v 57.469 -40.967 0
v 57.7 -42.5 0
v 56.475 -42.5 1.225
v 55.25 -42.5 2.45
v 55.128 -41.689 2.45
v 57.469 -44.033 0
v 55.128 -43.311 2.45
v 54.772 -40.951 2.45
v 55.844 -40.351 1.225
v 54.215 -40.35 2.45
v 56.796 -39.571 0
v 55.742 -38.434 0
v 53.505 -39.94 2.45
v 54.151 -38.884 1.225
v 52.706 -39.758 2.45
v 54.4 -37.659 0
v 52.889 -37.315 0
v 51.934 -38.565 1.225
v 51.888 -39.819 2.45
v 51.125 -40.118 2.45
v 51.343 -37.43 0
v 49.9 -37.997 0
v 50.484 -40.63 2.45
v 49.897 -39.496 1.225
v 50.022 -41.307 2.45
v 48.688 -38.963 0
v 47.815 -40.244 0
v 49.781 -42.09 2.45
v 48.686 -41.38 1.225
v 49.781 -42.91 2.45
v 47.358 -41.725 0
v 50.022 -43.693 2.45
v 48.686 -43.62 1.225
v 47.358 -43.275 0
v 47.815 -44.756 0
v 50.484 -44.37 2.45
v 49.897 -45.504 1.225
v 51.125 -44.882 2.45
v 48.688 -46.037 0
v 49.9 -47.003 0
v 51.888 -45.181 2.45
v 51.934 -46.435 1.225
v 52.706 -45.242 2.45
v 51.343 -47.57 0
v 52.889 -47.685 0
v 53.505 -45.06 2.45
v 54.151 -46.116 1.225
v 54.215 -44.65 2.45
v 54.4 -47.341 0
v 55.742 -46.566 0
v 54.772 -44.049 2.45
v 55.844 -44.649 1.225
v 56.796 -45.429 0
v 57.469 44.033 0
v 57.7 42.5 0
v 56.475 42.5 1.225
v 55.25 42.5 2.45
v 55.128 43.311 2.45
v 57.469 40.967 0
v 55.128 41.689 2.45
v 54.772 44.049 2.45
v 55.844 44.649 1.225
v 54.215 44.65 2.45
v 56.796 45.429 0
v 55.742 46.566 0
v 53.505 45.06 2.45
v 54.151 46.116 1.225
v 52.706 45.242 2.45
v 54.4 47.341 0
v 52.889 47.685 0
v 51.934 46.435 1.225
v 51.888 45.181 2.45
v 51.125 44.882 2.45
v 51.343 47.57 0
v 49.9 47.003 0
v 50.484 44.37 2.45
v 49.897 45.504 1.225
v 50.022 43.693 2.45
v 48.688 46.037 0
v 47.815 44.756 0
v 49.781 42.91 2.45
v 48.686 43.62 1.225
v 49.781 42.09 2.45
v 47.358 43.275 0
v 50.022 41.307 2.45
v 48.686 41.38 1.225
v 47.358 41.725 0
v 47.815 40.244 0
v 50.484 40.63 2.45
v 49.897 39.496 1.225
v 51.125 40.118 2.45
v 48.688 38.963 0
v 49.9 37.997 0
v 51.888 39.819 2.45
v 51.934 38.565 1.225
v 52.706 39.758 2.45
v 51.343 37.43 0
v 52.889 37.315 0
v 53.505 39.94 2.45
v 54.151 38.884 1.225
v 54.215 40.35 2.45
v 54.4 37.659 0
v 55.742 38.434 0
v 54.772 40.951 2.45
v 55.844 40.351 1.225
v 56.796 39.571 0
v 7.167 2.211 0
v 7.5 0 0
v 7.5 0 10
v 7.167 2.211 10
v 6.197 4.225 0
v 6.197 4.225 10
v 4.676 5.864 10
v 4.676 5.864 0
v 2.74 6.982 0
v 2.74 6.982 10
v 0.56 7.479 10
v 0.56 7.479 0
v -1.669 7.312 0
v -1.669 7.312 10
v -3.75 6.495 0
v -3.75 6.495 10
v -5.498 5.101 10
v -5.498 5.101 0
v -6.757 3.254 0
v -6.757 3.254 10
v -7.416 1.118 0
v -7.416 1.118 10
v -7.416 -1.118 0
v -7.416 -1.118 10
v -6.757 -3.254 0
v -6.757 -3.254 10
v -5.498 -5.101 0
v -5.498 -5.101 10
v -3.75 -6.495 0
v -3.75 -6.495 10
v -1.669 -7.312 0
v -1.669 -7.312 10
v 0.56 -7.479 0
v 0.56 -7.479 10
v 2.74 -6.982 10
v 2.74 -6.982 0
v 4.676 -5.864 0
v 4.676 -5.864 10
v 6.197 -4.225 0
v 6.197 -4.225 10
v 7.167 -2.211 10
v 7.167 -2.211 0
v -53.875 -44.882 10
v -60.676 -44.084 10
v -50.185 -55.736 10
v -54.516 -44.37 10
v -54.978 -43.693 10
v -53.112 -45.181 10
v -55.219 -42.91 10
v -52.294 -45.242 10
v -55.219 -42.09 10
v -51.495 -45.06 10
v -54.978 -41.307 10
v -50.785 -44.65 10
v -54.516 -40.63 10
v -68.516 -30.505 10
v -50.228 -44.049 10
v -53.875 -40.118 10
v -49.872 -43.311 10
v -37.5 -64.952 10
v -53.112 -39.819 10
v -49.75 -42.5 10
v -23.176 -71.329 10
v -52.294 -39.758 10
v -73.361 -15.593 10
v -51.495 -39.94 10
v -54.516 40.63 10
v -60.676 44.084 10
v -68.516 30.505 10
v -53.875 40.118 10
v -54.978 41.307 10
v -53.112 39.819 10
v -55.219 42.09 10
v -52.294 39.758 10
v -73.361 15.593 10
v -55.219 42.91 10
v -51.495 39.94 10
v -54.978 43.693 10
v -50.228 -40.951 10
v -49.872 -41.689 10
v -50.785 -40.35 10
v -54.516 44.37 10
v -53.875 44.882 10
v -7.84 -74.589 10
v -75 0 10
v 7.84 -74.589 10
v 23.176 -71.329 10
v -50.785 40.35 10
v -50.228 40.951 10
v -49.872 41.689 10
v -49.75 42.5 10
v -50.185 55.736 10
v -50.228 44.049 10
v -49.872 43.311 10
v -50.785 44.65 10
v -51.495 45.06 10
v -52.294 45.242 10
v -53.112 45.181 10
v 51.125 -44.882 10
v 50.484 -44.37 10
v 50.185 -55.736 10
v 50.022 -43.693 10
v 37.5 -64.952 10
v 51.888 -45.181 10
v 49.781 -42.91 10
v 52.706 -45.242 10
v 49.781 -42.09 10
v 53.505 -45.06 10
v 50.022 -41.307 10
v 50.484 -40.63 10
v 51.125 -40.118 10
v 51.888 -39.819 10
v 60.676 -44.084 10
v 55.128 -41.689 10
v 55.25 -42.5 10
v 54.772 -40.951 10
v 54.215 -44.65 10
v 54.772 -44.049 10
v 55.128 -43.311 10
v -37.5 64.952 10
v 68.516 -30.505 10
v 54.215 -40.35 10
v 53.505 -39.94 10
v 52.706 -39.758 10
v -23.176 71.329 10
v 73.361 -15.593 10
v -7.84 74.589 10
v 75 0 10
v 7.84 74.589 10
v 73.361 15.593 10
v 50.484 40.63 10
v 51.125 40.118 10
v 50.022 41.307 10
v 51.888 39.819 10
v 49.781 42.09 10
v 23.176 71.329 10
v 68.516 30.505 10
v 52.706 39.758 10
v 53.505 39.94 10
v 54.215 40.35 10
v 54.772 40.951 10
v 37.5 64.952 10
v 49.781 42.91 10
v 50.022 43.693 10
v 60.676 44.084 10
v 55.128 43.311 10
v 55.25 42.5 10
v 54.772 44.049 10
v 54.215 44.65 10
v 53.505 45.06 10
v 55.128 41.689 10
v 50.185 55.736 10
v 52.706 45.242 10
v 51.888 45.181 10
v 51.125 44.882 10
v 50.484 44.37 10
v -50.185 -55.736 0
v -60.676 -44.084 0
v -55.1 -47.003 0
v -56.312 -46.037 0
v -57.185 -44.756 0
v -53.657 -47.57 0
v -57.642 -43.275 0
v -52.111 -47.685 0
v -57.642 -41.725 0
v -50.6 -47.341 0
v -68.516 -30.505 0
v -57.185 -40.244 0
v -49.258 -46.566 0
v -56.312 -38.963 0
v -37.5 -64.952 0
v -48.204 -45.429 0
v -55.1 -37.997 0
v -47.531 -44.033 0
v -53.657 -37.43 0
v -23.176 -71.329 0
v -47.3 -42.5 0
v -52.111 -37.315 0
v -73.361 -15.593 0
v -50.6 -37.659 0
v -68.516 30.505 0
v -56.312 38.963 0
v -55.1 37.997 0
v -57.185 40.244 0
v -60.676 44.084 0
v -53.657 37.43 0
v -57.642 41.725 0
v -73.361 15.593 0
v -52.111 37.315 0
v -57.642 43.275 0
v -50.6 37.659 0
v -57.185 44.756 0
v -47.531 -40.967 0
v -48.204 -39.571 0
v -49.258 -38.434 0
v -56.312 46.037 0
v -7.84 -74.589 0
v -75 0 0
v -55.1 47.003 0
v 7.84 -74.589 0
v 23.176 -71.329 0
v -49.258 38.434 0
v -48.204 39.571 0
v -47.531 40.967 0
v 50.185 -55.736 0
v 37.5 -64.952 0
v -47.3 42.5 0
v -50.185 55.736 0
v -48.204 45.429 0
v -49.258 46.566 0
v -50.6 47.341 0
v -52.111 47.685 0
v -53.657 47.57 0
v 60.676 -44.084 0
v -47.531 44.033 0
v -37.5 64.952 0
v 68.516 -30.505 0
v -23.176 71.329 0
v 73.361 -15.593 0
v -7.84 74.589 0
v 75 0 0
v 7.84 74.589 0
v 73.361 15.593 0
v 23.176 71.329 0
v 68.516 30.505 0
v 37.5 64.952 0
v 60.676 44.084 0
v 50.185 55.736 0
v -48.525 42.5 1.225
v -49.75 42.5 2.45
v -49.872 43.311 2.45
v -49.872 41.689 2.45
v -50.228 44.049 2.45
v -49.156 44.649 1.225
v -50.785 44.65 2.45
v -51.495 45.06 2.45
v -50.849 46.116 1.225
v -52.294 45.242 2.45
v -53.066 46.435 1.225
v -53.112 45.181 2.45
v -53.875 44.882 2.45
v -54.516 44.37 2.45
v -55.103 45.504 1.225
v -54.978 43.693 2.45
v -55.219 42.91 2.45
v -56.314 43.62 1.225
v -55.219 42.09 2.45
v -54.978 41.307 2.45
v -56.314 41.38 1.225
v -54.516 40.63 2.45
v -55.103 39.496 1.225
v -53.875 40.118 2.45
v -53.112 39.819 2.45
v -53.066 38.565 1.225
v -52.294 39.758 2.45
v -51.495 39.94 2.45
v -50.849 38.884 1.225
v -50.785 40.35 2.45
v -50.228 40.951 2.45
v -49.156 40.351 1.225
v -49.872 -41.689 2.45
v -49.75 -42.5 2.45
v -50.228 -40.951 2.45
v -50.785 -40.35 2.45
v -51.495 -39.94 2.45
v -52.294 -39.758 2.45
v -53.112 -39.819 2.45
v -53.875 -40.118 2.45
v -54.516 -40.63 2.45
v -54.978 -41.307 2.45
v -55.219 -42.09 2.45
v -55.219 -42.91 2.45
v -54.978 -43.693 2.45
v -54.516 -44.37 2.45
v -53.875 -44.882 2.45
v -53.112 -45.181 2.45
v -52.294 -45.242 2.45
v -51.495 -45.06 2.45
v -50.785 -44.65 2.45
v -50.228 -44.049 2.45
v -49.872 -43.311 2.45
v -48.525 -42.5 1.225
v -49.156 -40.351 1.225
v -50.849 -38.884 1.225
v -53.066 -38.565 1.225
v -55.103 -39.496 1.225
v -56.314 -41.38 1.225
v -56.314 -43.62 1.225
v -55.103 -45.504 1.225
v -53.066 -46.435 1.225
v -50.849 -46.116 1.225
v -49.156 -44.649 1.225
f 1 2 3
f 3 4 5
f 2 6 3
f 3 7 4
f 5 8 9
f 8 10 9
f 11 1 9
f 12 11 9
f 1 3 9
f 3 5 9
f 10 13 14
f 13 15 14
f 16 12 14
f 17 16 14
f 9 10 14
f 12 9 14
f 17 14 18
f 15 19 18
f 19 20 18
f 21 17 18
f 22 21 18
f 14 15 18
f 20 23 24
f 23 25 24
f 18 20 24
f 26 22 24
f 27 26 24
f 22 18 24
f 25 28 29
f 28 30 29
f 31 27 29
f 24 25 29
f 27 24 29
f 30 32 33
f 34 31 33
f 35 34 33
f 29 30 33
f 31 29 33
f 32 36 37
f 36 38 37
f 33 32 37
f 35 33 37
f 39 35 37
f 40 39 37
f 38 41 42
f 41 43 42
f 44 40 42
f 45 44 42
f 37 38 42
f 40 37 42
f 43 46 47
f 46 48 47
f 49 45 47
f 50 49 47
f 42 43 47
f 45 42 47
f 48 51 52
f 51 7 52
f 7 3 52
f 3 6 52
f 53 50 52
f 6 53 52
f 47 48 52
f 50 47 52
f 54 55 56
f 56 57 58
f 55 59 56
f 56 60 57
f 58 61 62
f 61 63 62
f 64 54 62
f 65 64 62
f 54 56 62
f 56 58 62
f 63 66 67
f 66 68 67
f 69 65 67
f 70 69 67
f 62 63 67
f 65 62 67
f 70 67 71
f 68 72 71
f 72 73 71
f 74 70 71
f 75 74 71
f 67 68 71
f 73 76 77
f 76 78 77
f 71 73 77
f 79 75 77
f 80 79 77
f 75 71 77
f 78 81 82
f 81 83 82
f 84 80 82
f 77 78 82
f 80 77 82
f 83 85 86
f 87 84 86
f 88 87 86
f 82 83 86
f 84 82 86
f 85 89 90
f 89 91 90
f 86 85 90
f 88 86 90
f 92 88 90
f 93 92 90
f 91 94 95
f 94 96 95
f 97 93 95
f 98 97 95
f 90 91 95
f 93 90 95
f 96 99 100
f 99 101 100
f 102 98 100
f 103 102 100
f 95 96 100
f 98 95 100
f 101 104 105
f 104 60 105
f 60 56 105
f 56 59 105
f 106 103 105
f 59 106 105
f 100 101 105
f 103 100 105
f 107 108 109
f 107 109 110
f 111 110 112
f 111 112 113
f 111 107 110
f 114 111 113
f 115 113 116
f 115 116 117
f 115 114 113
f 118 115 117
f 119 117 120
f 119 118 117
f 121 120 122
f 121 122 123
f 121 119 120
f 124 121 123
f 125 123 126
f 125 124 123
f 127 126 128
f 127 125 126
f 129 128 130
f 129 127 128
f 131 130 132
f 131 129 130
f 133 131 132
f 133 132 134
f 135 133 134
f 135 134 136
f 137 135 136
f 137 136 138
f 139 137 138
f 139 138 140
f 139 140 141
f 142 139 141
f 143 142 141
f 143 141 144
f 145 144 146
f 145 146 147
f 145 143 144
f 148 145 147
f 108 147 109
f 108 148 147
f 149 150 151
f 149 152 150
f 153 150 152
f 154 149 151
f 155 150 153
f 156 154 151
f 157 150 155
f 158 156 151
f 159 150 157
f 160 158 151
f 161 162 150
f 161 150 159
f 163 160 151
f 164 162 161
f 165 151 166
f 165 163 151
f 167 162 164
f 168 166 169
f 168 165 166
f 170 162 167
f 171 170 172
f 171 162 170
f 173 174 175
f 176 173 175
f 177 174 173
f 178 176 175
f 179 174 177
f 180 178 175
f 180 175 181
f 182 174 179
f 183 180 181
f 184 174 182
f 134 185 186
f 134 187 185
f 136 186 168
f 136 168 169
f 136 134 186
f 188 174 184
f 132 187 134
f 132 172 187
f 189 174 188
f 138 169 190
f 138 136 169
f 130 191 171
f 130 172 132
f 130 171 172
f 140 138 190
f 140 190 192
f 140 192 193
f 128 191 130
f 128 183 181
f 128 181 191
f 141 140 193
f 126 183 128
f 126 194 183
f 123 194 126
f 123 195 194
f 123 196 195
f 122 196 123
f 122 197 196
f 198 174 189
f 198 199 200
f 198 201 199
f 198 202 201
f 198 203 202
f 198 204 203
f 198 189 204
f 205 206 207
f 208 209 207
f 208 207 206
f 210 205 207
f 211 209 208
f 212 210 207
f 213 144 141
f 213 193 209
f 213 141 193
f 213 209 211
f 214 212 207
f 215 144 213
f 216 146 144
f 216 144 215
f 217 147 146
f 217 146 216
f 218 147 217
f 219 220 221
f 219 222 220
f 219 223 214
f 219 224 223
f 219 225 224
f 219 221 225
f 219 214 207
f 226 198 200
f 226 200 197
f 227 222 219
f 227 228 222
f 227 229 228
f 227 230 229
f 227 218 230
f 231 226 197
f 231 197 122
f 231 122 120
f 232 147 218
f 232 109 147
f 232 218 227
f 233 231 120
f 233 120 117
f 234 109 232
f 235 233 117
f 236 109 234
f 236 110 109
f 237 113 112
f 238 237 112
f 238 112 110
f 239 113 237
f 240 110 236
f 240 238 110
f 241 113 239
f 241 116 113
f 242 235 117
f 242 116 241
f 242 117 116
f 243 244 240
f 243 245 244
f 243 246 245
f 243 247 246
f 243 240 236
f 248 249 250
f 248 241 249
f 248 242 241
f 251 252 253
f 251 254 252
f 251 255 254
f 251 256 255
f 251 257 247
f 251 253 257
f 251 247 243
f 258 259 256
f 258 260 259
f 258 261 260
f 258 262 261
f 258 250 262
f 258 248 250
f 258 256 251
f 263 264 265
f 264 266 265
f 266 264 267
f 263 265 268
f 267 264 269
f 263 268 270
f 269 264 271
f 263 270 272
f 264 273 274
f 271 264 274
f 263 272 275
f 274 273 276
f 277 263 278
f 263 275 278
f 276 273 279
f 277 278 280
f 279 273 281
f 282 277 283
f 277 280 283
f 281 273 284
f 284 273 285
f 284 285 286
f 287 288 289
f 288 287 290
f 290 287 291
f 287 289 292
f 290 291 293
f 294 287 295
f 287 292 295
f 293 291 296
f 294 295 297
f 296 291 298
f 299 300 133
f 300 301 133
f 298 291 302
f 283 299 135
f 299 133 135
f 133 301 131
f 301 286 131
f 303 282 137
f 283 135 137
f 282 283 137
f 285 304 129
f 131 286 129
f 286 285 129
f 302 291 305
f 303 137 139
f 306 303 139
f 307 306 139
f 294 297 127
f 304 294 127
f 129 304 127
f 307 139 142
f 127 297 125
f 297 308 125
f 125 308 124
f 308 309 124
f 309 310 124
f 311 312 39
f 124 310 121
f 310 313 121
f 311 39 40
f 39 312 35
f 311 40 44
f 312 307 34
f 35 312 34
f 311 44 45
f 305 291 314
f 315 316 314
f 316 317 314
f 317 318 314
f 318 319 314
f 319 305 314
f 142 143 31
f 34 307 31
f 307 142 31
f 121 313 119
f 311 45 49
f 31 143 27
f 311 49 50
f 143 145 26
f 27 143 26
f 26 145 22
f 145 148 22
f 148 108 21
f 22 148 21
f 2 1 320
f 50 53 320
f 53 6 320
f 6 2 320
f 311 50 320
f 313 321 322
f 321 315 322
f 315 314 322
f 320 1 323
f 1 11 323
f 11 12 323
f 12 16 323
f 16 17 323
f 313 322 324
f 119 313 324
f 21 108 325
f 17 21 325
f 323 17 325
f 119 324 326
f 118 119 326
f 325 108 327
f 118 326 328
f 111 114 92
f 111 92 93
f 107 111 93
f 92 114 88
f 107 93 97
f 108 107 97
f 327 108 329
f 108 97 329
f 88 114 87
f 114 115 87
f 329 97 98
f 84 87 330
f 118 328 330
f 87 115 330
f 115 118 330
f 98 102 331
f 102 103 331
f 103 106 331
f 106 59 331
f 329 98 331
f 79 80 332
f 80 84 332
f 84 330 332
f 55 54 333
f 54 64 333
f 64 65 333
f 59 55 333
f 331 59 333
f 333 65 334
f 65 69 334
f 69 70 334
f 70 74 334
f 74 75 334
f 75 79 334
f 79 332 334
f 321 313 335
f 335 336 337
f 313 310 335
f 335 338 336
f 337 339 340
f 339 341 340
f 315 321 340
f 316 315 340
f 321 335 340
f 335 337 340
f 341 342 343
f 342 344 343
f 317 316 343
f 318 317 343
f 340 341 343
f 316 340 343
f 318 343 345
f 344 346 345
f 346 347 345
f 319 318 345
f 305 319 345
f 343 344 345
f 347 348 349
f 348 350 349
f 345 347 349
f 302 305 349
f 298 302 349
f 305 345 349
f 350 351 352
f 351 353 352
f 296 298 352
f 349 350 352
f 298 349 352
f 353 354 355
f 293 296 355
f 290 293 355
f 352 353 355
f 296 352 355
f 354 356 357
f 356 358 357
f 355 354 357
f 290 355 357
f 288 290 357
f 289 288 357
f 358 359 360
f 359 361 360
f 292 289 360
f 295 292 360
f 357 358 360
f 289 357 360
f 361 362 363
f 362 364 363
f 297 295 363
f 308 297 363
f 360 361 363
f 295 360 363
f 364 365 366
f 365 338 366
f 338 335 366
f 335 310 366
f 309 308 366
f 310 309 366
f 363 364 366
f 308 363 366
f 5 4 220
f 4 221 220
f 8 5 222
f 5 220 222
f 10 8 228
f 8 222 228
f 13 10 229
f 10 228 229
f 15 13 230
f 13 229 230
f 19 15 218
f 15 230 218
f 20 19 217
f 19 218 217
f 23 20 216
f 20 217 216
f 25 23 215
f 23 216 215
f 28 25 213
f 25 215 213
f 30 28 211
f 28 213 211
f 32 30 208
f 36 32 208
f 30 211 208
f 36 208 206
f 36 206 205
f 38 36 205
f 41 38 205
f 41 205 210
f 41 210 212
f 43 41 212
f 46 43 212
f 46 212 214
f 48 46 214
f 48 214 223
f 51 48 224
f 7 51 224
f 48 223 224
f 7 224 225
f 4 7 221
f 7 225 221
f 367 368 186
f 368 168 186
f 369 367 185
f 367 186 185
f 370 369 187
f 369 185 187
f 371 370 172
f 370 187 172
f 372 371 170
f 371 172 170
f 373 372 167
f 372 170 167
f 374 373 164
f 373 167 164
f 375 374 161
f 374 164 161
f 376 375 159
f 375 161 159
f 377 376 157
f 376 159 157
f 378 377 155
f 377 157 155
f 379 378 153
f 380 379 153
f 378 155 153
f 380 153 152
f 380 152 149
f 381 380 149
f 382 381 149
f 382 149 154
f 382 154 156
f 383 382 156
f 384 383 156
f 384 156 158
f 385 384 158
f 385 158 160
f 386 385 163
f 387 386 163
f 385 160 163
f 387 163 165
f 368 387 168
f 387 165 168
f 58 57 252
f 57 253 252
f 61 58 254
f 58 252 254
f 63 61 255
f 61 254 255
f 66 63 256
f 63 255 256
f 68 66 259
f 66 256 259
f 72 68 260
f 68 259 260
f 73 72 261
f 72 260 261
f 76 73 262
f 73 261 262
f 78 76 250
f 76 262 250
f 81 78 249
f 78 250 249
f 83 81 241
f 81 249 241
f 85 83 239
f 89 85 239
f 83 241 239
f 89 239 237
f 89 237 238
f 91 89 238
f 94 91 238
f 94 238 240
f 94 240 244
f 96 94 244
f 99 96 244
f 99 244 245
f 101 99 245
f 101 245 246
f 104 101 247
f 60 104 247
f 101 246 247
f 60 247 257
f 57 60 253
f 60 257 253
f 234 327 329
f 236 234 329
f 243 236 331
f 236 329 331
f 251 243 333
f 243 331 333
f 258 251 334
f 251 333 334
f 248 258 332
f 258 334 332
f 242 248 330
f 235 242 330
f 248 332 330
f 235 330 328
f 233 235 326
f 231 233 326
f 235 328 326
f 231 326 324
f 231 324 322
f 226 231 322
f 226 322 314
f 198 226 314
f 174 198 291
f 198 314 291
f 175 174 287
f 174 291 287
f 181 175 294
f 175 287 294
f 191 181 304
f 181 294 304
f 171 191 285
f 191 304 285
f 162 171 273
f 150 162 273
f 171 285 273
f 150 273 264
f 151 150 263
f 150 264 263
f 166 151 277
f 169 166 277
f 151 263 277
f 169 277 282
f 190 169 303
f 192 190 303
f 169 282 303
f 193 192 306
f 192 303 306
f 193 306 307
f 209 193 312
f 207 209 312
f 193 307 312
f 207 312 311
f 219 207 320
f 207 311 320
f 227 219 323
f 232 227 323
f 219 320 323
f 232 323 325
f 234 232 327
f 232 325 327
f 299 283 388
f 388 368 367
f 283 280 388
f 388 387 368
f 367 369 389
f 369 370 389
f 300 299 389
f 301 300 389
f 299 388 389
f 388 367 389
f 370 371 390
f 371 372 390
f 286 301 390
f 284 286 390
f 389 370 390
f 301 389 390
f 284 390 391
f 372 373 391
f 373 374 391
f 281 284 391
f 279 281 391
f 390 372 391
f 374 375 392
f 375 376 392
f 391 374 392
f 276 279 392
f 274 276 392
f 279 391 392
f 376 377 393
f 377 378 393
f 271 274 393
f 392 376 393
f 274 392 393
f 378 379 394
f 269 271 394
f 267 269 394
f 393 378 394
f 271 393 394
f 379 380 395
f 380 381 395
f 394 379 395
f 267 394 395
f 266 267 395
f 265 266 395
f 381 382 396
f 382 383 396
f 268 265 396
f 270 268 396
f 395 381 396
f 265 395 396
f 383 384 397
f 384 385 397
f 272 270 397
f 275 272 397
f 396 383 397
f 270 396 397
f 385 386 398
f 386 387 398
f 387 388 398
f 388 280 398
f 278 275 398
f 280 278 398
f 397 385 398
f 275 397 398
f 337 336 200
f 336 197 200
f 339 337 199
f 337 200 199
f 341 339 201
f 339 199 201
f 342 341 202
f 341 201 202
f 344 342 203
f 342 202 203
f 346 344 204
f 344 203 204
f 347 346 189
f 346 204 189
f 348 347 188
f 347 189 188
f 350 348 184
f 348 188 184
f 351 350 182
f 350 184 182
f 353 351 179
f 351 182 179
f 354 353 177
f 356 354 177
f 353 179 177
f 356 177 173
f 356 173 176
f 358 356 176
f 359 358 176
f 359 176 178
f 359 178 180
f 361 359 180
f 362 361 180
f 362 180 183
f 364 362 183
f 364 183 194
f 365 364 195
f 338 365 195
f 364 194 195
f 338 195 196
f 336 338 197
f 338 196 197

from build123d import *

# Parameters (mm, degrees)
SKETCH1_R                                       = 75
SKETCH1_R_2                                     = 7.5
BOSS_EXTRUDE1_DEPTH                             = 10
SKETCH2_R                                       = 1.5
CUT_EXTRUDE1_DEPTH                              = 107.536378763
CSK_FOR_M5_FLAT_HEAD_MACHINE_SCREW1_D           = 5.5
CSK_FOR_M5_FLAT_HEAD_MACHINE_SCREW1_CSINK_D     = 10.4
CSK_FOR_M5_FLAT_HEAD_MACHINE_SCREW1_CSINK_ANGLE = 90


with BuildPart() as part:
    # Sketch1 → Boss-Extrude1 (new body)
    with BuildSketch(Plane(origin=(0, 0, 0), x_dir=(0, 1, 0), z_dir=(0, 0, 1))):
        with Locations(Location((0, 0, 0), (0, 0, 270))):
            Circle(SKETCH1_R)
        with Locations(Location((0, 0, 0), (0, 0, 270))):
            Circle(SKETCH1_R_2, mode=Mode.SUBTRACT)
    extrude(amount=BOSS_EXTRUDE1_DEPTH)

    # Sketch2 → Cut-Extrude1 (cut, through all)
    with BuildSketch(Plane.XY.offset(10)):
        with Locations((-52.5, 42.5)):
            Circle(SKETCH2_R)
        with Locations((52.5, 42.5)):
            Circle(SKETCH2_R)
        with Locations((52.5, -42.5)):
            Circle(SKETCH2_R)
        with Locations((-52.5, -42.5)):
            Circle(SKETCH2_R)
    extrude(amount=-CUT_EXTRUDE1_DEPTH, mode=Mode.SUBTRACT)

    # CSK for M5 Flat Head Machine Screw1 (through all)
    with Locations(Plane(origin=(-52.5, -42.5, 0), x_dir=(-1, 0, 0), z_dir=(0, 0, -1))):
        with Locations((0, 0), (-105, 0), (-105, 85), (0, 85)):
            CounterSinkHole(CSK_FOR_M5_FLAT_HEAD_MACHINE_SCREW1_D / 2, CSK_FOR_M5_FLAT_HEAD_MACHINE_SCREW1_CSINK_D / 2, counter_sink_angle=CSK_FOR_M5_FLAT_HEAD_MACHINE_SCREW1_CSINK_ANGLE)


solid = part.part
